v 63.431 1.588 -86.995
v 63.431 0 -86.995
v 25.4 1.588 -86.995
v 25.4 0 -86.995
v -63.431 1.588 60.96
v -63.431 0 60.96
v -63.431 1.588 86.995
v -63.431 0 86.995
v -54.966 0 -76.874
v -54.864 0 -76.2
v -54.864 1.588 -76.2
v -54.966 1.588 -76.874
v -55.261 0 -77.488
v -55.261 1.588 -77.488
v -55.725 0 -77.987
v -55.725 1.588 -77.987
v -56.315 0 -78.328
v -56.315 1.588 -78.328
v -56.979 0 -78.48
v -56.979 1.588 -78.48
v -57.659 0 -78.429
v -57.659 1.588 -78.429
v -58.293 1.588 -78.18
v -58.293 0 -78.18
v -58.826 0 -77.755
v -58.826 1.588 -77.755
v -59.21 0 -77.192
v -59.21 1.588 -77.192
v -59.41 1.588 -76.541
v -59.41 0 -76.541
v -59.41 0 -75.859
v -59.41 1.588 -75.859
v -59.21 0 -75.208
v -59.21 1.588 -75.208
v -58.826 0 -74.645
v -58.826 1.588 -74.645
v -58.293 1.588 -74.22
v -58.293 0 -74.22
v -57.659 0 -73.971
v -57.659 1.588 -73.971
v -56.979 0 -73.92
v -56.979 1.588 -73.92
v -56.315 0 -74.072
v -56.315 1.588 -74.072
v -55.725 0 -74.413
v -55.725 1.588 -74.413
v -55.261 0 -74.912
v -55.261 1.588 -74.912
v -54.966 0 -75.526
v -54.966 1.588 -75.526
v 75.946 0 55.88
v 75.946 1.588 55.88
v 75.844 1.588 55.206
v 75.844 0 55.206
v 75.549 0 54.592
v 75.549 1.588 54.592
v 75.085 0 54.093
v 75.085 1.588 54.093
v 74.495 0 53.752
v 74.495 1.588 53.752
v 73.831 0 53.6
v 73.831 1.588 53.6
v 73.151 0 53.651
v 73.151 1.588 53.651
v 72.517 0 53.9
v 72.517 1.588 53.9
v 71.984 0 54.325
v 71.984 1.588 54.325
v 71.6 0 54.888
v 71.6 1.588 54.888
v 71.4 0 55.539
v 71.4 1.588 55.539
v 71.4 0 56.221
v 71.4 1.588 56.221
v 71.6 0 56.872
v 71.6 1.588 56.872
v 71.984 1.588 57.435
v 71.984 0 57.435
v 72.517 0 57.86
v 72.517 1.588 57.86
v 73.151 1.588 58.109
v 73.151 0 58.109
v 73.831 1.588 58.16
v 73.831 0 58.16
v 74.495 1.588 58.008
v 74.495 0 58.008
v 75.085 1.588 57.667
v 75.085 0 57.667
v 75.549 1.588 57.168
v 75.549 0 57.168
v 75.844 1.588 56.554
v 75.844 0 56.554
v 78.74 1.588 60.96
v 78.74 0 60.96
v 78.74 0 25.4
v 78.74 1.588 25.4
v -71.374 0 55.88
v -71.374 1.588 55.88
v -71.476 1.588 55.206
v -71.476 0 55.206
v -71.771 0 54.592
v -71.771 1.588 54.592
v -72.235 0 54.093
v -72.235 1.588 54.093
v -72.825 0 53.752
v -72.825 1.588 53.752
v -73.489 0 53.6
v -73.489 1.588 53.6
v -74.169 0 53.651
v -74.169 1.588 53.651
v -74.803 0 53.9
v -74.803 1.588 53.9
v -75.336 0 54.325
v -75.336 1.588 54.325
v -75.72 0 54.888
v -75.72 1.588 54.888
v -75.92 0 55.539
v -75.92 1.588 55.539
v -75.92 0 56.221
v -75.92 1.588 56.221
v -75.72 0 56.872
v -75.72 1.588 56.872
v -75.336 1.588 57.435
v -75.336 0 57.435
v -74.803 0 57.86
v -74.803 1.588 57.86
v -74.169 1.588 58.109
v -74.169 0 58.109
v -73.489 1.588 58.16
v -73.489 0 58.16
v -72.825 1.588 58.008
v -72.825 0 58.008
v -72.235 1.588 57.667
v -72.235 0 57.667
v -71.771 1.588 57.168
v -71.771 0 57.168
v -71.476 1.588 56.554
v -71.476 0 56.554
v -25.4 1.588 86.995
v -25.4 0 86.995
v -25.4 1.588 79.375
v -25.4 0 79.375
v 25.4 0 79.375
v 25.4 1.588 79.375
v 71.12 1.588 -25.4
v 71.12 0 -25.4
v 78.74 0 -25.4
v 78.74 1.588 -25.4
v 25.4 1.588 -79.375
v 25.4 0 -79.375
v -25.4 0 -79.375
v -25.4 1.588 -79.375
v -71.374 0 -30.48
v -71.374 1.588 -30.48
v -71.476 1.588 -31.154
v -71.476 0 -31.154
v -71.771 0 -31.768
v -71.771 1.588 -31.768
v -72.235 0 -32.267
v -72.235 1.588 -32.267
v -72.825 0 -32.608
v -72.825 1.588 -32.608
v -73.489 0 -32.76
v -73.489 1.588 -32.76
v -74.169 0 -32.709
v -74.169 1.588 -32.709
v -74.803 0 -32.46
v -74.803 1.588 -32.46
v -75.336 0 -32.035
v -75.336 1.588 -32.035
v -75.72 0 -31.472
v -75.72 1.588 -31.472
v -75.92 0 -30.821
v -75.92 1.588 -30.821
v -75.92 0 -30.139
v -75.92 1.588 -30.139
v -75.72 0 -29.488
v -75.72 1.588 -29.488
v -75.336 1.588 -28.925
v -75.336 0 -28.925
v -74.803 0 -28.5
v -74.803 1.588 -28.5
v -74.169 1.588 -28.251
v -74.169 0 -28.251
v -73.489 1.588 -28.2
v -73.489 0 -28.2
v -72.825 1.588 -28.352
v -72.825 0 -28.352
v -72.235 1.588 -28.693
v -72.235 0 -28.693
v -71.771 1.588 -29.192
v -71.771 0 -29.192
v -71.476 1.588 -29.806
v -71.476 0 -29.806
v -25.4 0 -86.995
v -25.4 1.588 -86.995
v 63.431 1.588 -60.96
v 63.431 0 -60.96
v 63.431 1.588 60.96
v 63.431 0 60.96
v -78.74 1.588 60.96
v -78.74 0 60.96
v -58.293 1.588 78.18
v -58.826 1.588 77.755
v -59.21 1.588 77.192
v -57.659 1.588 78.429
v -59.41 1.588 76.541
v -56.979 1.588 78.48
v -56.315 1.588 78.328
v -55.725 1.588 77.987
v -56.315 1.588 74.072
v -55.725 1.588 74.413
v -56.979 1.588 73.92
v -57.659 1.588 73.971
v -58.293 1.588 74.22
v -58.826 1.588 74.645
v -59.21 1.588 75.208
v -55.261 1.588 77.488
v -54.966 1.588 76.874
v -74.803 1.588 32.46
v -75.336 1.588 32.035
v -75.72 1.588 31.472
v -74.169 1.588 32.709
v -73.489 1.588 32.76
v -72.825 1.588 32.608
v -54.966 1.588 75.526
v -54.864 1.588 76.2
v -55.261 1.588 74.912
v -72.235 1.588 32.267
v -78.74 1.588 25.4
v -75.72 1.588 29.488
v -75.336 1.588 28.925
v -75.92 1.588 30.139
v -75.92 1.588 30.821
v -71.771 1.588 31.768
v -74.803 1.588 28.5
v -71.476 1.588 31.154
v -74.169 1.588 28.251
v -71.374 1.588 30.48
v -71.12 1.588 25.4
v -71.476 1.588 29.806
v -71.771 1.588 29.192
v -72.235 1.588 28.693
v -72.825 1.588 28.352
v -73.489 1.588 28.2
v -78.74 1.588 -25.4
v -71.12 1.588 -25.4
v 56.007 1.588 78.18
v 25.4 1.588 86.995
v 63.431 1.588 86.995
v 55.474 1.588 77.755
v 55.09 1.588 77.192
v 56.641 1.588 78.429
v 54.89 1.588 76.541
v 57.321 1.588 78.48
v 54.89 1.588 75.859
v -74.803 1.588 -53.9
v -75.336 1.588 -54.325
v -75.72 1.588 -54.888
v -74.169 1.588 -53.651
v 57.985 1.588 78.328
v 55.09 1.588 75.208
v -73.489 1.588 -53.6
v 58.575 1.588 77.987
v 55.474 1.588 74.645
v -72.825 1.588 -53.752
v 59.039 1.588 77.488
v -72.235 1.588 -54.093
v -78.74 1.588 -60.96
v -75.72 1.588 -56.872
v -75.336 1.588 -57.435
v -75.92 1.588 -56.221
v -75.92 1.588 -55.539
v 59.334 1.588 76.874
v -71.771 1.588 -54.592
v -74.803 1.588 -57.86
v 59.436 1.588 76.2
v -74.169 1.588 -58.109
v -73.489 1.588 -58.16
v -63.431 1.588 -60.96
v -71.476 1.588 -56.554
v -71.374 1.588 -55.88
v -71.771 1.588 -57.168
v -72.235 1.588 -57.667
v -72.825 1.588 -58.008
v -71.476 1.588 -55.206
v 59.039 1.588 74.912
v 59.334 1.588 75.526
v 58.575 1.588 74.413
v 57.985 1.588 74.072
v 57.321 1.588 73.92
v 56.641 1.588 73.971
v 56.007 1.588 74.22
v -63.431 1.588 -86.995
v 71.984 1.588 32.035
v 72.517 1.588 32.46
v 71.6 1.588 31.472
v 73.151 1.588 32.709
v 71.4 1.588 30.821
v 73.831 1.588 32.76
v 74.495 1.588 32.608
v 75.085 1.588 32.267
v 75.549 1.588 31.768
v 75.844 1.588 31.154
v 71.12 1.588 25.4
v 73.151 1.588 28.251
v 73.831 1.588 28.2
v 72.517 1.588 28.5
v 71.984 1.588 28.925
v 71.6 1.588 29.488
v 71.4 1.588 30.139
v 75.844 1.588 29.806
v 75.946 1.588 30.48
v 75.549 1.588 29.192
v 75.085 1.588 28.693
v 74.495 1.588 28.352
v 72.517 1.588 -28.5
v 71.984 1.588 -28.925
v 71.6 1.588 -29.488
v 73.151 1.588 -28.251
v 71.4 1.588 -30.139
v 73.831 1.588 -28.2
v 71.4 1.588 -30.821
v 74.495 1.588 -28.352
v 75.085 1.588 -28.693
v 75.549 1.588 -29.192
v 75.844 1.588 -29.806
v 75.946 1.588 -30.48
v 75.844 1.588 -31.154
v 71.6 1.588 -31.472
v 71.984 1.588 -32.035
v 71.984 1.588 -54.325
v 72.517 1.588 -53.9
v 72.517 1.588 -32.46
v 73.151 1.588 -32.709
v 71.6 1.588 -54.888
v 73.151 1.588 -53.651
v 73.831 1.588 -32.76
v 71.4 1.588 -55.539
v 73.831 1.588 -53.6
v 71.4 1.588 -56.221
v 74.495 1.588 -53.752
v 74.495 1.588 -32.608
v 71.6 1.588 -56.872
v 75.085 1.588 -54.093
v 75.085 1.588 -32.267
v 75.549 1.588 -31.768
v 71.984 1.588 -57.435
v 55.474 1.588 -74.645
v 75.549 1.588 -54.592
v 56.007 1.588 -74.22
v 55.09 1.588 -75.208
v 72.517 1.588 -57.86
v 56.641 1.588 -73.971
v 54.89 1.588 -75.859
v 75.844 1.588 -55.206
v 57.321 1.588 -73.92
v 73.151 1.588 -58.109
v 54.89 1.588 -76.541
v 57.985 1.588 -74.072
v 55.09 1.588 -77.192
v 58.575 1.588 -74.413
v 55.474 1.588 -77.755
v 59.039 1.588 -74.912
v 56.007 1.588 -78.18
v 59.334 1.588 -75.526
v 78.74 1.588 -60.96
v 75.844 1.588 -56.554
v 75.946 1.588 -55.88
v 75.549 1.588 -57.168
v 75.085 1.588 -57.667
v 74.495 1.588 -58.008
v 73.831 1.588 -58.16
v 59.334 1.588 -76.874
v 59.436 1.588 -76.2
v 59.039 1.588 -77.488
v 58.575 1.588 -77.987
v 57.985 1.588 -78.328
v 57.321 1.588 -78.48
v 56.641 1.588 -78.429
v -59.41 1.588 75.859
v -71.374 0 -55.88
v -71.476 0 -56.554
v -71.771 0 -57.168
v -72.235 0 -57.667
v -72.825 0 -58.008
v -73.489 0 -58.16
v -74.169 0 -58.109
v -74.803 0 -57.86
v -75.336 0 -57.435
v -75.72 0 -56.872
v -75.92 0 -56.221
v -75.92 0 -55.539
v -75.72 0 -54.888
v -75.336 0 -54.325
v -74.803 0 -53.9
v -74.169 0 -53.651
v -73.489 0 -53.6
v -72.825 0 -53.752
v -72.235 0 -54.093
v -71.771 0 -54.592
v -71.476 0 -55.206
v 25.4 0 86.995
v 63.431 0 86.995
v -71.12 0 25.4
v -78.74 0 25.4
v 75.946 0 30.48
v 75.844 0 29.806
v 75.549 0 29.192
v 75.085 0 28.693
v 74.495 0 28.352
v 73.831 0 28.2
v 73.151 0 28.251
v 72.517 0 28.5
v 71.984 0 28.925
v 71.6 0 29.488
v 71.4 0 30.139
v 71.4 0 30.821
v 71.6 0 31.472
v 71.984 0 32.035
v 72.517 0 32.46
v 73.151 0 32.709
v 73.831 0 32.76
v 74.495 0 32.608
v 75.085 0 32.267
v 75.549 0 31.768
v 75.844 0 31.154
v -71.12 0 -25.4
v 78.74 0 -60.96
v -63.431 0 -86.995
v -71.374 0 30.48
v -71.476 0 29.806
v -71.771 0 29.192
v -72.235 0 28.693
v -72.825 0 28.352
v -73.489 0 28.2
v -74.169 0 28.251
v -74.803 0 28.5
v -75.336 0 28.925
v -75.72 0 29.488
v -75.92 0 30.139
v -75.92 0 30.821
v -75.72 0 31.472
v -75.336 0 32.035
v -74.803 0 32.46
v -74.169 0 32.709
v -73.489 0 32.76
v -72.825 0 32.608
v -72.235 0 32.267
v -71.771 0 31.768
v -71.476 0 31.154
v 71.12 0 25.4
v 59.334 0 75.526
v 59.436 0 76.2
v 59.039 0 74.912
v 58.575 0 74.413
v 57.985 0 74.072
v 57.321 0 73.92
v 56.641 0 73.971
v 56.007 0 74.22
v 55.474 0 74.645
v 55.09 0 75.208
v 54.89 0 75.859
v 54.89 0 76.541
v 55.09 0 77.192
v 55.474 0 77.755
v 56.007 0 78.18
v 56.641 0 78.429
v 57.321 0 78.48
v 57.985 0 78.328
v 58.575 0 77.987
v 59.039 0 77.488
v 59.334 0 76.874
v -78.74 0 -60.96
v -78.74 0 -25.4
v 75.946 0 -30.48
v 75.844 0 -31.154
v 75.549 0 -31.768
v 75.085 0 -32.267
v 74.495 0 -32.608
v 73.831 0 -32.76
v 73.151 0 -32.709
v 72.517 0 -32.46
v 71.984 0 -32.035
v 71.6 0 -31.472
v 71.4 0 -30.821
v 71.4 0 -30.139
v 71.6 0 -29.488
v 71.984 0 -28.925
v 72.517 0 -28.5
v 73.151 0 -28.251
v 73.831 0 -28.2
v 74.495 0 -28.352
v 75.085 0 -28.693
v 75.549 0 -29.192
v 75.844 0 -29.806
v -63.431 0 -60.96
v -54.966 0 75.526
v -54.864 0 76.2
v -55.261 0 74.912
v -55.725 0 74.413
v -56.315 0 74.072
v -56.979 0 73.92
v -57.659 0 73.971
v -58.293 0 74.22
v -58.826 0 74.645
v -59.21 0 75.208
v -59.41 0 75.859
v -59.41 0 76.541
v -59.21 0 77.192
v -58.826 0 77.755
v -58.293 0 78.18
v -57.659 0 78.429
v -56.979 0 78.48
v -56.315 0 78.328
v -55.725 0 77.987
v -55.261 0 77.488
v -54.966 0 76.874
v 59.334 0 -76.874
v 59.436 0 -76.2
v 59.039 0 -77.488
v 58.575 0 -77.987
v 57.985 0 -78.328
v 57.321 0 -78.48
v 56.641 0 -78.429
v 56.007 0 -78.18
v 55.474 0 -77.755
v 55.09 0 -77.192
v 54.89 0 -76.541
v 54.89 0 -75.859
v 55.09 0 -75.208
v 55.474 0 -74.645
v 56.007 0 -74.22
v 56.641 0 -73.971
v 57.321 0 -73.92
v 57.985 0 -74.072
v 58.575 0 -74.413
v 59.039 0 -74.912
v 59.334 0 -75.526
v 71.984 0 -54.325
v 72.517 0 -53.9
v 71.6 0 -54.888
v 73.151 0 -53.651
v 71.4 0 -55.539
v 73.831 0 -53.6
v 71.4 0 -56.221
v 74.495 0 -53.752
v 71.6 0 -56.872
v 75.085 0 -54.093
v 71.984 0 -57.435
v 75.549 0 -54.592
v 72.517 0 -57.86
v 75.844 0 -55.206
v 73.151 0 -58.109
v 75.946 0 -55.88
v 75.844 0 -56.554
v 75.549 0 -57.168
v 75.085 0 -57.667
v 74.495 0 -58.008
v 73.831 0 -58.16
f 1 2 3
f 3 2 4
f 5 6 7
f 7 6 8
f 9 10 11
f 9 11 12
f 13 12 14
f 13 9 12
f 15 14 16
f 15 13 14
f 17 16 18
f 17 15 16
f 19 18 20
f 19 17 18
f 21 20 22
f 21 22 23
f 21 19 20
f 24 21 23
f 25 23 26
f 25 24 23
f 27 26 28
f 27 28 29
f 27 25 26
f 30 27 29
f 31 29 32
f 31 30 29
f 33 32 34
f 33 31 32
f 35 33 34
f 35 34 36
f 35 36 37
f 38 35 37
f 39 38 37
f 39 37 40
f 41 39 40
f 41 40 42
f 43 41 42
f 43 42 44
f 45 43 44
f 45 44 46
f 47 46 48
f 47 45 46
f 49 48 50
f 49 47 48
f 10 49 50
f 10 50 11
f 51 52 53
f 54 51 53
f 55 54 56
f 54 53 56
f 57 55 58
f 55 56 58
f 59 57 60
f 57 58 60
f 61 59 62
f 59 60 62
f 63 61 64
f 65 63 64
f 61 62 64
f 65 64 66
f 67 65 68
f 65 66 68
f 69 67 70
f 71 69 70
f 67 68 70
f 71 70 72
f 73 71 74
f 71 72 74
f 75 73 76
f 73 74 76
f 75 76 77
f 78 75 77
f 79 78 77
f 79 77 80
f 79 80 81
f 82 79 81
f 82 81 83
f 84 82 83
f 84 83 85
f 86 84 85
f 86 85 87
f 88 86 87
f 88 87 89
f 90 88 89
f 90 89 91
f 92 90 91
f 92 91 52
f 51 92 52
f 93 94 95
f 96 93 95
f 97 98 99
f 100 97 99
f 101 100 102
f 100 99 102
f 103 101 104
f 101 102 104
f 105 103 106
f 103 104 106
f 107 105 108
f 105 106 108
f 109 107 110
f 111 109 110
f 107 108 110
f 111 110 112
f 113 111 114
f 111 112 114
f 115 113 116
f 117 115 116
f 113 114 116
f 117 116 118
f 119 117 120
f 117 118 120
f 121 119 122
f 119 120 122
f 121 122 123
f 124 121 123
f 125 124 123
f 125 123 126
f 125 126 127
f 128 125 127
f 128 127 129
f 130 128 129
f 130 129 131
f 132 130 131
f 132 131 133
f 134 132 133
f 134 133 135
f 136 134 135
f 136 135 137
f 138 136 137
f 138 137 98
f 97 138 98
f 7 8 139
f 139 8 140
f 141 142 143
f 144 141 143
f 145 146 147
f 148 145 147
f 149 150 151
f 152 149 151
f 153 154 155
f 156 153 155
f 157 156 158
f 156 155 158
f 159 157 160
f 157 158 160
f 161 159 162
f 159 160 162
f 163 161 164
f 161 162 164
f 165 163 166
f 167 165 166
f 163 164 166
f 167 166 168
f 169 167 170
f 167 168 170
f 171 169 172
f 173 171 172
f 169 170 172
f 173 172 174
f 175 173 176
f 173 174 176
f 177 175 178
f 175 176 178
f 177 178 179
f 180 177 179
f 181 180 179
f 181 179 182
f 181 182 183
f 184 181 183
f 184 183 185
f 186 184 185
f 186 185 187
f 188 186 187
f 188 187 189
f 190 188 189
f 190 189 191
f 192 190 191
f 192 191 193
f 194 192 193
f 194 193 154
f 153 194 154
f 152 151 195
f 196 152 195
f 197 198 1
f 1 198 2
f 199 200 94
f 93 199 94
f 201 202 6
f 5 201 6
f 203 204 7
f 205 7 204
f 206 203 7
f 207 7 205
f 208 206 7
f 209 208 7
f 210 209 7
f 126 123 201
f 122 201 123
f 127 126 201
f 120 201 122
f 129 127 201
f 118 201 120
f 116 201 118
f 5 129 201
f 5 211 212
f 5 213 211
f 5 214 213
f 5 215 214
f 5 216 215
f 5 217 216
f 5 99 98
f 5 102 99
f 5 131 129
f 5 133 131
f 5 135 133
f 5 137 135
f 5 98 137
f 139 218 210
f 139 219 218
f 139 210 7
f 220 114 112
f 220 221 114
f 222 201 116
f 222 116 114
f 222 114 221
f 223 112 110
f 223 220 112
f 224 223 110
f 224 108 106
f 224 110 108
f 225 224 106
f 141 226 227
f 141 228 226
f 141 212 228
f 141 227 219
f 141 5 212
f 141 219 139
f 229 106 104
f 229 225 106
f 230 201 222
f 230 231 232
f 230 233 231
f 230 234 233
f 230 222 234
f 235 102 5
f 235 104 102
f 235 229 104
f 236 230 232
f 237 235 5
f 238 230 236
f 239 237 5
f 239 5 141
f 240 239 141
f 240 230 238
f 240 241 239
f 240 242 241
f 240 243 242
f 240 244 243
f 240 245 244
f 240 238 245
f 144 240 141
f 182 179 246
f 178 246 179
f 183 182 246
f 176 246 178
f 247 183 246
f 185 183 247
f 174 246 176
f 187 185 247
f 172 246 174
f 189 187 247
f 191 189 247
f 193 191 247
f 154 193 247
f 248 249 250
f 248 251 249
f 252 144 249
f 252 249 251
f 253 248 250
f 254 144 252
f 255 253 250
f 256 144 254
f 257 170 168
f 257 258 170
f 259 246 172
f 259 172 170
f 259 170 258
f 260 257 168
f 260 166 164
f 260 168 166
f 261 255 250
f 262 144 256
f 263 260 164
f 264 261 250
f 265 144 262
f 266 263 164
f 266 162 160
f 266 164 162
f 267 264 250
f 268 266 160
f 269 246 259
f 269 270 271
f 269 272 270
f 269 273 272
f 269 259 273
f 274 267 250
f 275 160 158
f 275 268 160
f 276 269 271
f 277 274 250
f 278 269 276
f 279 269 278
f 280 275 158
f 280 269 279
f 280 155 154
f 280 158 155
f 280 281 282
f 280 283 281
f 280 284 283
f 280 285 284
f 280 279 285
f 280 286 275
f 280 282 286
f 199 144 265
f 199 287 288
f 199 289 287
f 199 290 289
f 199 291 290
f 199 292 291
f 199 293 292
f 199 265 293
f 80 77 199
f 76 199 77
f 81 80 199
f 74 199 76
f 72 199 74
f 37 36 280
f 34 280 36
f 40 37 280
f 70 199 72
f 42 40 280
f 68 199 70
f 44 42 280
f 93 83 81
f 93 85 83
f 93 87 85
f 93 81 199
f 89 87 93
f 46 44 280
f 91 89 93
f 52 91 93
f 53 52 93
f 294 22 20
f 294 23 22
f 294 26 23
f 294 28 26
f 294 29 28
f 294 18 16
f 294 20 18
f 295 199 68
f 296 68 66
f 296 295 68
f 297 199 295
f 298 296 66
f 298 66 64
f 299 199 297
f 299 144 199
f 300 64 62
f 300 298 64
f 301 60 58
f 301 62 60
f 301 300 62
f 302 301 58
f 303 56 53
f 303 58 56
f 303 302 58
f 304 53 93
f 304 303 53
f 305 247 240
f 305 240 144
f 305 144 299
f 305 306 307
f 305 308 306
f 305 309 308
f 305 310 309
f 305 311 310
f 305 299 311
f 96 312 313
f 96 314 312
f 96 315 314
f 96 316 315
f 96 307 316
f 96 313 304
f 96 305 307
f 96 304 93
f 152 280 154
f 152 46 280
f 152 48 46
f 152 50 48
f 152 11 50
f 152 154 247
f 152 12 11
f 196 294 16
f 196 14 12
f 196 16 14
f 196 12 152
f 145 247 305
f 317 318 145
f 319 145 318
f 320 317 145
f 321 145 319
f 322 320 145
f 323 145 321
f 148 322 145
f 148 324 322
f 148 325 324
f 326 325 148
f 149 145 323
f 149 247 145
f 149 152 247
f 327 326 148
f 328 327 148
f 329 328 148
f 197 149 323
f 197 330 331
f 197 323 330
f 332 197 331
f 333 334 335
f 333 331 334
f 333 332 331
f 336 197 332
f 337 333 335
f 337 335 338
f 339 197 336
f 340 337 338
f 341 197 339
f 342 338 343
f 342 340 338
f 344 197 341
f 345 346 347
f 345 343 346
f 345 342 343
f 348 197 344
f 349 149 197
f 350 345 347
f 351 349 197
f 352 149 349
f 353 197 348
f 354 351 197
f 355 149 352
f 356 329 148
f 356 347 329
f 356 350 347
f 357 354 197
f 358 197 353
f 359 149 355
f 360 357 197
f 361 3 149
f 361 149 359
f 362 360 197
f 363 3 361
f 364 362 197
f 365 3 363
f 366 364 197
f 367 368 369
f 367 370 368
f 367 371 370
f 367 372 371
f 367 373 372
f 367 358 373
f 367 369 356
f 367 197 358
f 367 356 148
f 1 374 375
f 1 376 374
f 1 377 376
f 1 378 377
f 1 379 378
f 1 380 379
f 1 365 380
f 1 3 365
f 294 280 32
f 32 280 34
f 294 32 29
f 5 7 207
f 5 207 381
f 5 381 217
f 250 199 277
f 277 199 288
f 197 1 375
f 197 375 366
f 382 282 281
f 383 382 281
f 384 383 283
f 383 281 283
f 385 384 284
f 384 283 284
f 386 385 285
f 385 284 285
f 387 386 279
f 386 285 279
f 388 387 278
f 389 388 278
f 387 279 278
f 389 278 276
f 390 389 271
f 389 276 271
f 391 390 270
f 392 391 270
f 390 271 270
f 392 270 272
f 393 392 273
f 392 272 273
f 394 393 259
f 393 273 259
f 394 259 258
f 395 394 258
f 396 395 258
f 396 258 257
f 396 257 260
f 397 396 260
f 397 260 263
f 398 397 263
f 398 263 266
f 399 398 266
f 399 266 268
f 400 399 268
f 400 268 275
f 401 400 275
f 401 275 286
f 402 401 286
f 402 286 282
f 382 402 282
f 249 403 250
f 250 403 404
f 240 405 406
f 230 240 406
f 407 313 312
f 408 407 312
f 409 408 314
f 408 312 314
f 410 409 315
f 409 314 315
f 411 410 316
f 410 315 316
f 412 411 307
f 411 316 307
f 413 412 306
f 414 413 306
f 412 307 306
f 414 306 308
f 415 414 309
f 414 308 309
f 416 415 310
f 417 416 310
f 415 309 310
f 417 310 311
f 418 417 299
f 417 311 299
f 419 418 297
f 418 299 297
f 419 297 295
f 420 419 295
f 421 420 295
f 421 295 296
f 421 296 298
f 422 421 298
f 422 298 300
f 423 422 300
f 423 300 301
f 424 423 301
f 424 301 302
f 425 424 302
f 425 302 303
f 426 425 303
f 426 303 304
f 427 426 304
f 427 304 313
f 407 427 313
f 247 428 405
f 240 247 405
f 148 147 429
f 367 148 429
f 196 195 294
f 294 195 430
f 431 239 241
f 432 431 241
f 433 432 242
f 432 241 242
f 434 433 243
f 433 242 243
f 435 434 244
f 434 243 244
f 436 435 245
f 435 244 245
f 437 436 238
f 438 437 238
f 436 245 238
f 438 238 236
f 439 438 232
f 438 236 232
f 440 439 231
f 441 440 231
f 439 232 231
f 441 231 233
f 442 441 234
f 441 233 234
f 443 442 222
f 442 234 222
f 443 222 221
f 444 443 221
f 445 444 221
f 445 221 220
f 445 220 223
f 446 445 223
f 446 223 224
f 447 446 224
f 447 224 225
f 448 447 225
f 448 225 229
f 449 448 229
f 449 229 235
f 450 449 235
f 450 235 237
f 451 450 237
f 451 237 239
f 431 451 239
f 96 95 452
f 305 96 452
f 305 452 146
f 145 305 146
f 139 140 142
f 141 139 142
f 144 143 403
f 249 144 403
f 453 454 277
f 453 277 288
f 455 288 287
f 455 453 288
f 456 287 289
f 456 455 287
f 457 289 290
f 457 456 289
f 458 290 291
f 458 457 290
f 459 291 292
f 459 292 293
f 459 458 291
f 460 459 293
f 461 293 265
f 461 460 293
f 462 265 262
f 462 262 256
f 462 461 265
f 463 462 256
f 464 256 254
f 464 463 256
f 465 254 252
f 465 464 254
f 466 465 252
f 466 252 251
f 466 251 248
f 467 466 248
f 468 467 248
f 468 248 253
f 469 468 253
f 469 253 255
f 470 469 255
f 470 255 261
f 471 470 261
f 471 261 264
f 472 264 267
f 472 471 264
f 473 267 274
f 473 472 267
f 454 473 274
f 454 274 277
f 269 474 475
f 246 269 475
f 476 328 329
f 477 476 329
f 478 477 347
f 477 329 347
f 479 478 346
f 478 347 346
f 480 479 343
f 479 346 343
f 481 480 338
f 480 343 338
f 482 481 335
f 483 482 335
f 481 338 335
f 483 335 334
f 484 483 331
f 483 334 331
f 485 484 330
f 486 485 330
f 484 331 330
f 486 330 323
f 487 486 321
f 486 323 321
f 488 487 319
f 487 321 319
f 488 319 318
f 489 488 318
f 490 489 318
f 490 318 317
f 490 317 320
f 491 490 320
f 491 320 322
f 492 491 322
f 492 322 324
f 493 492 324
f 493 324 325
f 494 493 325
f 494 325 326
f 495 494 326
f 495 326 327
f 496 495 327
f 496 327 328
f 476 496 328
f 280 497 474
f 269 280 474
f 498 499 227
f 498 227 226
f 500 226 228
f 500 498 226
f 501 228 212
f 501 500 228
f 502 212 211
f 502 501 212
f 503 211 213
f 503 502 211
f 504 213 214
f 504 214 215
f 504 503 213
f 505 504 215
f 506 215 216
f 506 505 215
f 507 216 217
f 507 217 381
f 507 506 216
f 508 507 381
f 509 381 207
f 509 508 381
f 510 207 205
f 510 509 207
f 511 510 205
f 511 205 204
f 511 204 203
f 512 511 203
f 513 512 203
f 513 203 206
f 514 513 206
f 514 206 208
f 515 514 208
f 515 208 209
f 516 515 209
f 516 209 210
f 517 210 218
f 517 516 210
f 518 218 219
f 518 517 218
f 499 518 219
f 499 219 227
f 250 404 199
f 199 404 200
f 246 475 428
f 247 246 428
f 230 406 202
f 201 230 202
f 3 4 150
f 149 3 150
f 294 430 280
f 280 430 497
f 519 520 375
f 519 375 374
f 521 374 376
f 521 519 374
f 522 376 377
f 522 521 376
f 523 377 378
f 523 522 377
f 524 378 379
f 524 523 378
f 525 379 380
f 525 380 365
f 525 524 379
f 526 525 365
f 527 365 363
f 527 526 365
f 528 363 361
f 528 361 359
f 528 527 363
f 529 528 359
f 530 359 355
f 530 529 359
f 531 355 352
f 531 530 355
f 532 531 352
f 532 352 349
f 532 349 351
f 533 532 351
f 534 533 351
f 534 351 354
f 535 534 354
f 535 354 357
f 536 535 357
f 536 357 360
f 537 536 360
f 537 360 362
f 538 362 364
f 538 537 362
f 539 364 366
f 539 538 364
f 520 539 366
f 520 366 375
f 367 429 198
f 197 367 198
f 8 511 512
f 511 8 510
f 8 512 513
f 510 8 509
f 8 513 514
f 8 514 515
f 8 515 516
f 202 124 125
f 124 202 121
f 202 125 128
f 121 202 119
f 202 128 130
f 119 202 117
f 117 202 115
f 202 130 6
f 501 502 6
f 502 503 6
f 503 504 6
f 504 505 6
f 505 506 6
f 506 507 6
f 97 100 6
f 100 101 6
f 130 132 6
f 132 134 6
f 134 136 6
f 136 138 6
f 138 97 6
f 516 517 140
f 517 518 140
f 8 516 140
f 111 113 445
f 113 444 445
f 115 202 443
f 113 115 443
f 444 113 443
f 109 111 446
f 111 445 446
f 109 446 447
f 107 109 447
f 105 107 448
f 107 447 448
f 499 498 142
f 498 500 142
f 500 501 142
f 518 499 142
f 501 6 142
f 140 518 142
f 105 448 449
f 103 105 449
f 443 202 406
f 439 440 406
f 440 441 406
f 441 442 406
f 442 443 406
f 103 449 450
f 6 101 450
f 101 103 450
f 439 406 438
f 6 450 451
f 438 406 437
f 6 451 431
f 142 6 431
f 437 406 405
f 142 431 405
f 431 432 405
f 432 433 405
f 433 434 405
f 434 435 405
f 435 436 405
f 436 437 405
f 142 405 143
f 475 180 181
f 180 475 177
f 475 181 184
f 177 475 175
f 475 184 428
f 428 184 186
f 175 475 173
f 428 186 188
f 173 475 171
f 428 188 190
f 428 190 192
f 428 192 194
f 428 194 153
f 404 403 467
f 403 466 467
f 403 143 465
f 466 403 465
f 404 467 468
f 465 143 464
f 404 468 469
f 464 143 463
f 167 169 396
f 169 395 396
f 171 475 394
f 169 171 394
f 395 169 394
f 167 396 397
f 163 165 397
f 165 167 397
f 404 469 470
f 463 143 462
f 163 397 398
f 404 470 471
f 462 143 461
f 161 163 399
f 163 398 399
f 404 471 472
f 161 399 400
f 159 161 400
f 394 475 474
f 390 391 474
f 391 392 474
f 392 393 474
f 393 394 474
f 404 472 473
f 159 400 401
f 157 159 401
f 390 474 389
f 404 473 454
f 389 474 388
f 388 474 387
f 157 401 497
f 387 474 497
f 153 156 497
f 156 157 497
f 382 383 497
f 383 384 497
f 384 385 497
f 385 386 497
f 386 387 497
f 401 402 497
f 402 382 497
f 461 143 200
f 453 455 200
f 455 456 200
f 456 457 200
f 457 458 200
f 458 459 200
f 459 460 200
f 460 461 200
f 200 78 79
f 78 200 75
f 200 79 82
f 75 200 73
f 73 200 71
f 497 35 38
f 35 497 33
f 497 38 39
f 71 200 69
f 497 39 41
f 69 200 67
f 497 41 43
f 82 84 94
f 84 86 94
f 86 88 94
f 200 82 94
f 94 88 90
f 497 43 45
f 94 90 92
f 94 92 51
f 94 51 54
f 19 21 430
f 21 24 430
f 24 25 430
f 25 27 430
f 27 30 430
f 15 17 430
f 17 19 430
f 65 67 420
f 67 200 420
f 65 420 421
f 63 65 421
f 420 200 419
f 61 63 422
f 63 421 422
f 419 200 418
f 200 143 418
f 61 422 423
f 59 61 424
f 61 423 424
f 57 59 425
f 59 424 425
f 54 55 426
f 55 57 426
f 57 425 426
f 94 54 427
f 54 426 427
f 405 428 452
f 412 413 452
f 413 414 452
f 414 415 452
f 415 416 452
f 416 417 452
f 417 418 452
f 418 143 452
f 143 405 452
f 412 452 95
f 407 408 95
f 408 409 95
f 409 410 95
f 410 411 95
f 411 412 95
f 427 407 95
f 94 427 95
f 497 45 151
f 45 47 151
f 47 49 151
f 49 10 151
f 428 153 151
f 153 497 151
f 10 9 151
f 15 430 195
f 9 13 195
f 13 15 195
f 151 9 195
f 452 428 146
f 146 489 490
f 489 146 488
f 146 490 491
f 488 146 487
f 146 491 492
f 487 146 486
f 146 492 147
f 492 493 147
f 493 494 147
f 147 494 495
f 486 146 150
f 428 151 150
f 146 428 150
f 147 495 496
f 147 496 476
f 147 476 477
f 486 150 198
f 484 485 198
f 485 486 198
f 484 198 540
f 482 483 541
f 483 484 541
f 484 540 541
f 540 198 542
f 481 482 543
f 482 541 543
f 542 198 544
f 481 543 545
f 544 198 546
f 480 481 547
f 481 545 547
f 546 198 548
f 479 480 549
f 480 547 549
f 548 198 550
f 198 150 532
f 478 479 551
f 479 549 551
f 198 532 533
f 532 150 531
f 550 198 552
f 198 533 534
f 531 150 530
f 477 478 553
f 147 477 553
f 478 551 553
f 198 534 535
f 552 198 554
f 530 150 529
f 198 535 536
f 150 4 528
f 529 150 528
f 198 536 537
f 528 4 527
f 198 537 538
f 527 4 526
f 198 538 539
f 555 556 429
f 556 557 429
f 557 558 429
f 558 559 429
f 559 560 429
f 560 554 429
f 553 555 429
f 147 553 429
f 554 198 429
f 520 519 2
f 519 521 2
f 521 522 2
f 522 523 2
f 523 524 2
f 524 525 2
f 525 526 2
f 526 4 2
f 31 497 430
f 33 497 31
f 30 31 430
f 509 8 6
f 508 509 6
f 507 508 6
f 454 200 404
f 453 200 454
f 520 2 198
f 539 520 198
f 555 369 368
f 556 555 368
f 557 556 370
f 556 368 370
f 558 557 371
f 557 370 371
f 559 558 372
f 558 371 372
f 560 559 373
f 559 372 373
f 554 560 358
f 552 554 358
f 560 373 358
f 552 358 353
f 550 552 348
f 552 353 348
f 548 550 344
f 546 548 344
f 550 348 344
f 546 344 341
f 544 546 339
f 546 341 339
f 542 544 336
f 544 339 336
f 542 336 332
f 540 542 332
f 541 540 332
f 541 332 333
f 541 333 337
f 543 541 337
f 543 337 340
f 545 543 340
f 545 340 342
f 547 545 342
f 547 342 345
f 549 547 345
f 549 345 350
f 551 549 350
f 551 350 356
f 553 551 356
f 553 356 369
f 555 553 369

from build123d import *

# Parameters (mm, degrees)
SKETCH1_R           = 2.286
BOSS_EXTRUDE1_DEPTH = 1.5875
SKETCH2_R           = 2.286
CUT_EXTRUDE1_DEPTH  = 2.5875


with BuildPart() as part:
    # Sketch1 → Boss-Extrude1 (new body)
    with BuildSketch(Plane(origin=(0, 0, 0), x_dir=(1, 0, 0), z_dir=(0, 1, 0))):
        Polygon((-25.4, 86.995), (-63.43142, 86.995), (-63.43142, 60.96), (-78.74, 60.96), (-78.74, 25.4), (-71.12, 25.4), (-71.12, -25.4), (-78.74, -25.4), (-78.74, -60.96), (-63.43142, -60.96), (-63.43142, -86.995), (-25.4, -86.995), (-25.4, -79.375), (25.4, -79.375), (25.4, -86.995), (63.43142, -86.995), (63.43142, -60.96), (78.74, -60.96), (78.74, -25.4), (71.12, -25.4), (71.12, 25.4), (78.74, 25.4), (78.74, 60.96), (63.43142, 60.96), (63.43142, 86.995), (25.4, 86.995), (25.4, 79.375), (-25.4, 79.375), align=None)
        with Locations((-57.15, 76.2)):
            Circle(SKETCH1_R, mode=Mode.SUBTRACT)
        with Locations((57.15, 76.2)):
            Circle(SKETCH1_R, mode=Mode.SUBTRACT)
        with Locations((57.15, -76.2)):
            Circle(SKETCH1_R, mode=Mode.SUBTRACT)
        with Locations((-57.15, -76.2)):
            Circle(SKETCH1_R, mode=Mode.SUBTRACT)
    extrude(amount=BOSS_EXTRUDE1_DEPTH)

    # Sketch2 → Cut-Extrude1 (cut, through all)
    with BuildSketch(Plane(origin=(0, 1.5875, 0), x_dir=(1, 0, 0), z_dir=(0, 1, 0))):
        with Locations((-73.66, -30.48)):
            Circle(SKETCH2_R)
        with Locations((-73.66, -55.88)):
            Circle(SKETCH2_R)
        with Locations((73.66, -55.88)):
            Circle(SKETCH2_R)
        with Locations((73.66, -30.48)):
            Circle(SKETCH2_R)
        with Locations((73.66, 30.48)):
            Circle(SKETCH2_R)
        with Locations((73.66, 55.88)):
            Circle(SKETCH2_R)
        with Locations((-73.66, 55.88)):
            Circle(SKETCH2_R)
        with Locations((-73.66, 30.48)):
            Circle(SKETCH2_R)
    extrude(amount=-CUT_EXTRUDE1_DEPTH, mode=Mode.SUBTRACT)


solid = part.part
